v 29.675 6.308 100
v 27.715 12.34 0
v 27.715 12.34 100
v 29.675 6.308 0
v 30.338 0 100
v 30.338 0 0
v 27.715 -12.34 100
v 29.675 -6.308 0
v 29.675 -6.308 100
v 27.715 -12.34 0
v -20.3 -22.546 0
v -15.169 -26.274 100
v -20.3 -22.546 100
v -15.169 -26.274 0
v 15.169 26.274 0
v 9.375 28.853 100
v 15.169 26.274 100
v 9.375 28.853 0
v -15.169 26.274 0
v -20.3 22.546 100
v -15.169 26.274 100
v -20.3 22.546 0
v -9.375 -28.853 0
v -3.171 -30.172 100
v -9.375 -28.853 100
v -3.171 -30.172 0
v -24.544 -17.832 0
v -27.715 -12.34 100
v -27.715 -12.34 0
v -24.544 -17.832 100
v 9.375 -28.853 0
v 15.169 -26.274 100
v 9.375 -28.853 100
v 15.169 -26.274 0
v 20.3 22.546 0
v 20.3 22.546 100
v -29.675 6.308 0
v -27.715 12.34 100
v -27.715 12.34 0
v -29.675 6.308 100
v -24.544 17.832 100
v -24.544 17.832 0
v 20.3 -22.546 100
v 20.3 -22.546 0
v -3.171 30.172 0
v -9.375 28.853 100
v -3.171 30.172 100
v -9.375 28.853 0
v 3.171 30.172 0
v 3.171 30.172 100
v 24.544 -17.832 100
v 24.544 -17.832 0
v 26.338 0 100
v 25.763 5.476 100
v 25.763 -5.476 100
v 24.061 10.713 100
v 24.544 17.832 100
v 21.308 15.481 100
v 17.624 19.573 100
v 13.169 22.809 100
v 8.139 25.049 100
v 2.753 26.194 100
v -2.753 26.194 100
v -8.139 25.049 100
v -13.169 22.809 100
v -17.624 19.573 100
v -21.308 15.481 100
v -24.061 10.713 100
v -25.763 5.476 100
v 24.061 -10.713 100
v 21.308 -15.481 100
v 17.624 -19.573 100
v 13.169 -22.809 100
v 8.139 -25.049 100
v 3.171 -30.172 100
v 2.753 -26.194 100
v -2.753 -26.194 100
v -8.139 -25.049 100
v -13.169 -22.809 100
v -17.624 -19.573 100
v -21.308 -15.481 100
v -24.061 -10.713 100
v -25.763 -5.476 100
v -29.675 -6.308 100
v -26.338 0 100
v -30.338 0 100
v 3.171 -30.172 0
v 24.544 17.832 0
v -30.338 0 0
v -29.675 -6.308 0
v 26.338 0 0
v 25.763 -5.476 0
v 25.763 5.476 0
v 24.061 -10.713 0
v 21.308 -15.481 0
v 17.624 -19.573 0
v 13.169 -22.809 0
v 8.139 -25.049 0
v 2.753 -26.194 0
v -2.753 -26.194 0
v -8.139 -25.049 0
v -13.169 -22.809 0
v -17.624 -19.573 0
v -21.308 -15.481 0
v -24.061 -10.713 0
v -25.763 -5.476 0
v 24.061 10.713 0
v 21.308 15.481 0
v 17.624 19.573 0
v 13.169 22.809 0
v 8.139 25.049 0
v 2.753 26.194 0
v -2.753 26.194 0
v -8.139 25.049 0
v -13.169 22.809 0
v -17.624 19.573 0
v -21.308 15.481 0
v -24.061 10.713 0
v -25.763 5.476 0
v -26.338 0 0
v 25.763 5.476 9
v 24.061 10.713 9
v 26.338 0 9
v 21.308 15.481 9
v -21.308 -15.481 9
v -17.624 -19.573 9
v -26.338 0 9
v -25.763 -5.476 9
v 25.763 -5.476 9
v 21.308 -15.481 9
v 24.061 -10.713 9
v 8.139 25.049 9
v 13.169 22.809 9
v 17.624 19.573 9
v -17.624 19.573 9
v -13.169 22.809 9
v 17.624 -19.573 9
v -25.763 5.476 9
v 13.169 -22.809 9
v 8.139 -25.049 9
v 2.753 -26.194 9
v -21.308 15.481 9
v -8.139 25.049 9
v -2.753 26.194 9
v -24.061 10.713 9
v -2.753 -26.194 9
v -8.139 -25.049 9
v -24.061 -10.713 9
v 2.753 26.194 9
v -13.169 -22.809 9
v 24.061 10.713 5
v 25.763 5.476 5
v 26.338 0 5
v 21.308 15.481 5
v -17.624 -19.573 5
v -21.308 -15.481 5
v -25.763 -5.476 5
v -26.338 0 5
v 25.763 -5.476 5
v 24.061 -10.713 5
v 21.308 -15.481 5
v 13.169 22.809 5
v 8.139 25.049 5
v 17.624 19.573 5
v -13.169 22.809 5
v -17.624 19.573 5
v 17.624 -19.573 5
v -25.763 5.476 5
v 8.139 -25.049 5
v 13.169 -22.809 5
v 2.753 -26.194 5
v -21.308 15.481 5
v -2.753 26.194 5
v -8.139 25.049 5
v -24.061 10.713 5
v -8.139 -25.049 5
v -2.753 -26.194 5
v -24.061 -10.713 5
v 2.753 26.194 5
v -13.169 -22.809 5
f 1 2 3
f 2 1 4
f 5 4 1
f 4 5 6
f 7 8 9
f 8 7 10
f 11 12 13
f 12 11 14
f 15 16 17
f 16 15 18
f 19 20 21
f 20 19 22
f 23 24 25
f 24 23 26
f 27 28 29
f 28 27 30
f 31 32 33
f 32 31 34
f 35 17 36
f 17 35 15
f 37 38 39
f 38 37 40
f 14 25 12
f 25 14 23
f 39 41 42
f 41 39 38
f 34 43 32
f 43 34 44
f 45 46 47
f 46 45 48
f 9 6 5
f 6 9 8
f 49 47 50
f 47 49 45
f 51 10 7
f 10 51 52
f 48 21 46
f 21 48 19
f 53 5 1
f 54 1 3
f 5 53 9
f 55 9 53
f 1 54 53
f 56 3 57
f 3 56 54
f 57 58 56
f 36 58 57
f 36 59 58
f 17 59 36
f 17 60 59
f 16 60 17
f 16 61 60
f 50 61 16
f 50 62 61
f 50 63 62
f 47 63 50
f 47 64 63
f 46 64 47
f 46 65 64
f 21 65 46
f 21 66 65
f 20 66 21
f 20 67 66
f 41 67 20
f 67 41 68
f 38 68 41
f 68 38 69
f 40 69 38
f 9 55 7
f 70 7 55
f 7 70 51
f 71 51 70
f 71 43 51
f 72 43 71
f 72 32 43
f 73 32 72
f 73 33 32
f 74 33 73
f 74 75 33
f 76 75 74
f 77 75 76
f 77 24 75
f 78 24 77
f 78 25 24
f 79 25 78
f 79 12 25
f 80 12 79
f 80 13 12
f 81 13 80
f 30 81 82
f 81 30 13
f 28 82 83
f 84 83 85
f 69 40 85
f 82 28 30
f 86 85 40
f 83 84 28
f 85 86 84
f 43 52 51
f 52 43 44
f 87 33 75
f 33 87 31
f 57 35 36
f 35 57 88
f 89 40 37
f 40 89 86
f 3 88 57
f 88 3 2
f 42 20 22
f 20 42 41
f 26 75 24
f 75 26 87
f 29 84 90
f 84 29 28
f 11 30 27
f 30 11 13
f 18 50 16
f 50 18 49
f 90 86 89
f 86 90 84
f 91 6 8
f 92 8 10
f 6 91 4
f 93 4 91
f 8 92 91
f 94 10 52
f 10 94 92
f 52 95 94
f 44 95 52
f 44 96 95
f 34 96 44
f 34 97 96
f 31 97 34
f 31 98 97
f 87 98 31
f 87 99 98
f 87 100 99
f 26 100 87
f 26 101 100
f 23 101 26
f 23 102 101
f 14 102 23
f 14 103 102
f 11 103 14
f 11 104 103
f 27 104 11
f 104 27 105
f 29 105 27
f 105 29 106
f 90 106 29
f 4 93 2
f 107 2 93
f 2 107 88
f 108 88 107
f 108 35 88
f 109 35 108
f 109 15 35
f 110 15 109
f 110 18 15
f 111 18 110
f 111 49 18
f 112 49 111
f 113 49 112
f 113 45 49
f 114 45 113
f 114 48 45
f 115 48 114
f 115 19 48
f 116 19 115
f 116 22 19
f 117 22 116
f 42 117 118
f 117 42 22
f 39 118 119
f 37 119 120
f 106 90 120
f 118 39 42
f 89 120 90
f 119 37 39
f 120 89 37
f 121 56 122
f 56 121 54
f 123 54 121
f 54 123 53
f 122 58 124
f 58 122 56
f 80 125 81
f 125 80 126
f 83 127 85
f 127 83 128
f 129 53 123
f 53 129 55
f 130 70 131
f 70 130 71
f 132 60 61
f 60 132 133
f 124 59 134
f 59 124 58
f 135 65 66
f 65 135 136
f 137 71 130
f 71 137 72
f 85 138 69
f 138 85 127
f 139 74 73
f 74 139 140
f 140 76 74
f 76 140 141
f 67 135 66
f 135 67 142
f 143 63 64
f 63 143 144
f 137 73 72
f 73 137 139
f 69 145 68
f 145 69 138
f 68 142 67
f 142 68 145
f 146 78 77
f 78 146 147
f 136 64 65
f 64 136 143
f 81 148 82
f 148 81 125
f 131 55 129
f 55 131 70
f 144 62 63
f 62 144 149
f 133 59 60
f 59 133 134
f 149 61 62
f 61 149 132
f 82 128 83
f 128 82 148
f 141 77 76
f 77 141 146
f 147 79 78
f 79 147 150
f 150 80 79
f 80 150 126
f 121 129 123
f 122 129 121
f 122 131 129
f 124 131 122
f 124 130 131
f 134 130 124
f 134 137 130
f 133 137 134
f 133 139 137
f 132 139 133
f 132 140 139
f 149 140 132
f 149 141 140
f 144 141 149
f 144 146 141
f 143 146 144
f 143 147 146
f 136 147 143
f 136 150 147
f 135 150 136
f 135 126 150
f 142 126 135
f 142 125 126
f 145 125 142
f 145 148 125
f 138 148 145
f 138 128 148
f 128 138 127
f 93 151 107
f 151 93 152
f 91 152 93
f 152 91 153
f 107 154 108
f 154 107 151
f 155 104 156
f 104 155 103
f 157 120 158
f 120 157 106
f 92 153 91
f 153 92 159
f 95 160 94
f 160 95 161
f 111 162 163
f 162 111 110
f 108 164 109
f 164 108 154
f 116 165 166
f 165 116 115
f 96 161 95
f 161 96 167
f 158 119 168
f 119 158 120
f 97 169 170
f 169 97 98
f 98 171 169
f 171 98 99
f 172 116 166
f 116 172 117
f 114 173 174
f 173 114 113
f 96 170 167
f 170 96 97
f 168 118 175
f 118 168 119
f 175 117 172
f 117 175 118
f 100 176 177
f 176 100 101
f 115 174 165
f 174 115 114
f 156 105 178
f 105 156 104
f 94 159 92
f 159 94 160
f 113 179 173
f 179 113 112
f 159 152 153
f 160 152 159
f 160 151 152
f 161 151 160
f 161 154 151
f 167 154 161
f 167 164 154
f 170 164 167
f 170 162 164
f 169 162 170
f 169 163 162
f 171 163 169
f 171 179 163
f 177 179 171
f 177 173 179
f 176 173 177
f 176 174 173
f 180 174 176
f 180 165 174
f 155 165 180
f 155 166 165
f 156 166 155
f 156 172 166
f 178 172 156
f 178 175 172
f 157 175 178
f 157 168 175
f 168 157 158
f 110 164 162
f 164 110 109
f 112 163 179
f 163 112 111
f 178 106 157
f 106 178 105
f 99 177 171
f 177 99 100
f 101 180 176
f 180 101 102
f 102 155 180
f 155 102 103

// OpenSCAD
// Constants
golden_ratio = (1 + sqrt(5)) / 2;
pi = 3.14159265;

// Configuration (all numbers in mm)
height = 100;
radius = height / 2 * golden_ratio * (3/8);
wall_thickness = height / 25;
bottom_height = height / 20; // Empty space below the bottom

// Calculations
radius_inner = radius - wall_thickness;
hull_height = height - bottom_height - wall_thickness;

// Modules
module walls() {
	// To see the bottom plate, replace radius with radius_inner
	cylinder(h = height, r = radius);
}
module hull_cylinder() {
	translate([0, 0, wall_thickness + bottom_height]) {
		cylinder(h = hull_height, r = radius_inner);
	}
}
module bottom_cylinder() {
	cylinder(h = bottom_height, r = radius_inner);
}
module cup() {
	difference() {
		walls();
		hull_cylinder();
		bottom_cylinder();
	}
}

// Documentation
echo (str(
	"Cup ",
	"height=", height, ", ",
	"outer radius=", radius, ", ",
	"inner radius=", radius_inner, ", ",
	"volume=", pi * pow(radius_inner, 2) * hull_height / 1000000));

// Render
cup();
